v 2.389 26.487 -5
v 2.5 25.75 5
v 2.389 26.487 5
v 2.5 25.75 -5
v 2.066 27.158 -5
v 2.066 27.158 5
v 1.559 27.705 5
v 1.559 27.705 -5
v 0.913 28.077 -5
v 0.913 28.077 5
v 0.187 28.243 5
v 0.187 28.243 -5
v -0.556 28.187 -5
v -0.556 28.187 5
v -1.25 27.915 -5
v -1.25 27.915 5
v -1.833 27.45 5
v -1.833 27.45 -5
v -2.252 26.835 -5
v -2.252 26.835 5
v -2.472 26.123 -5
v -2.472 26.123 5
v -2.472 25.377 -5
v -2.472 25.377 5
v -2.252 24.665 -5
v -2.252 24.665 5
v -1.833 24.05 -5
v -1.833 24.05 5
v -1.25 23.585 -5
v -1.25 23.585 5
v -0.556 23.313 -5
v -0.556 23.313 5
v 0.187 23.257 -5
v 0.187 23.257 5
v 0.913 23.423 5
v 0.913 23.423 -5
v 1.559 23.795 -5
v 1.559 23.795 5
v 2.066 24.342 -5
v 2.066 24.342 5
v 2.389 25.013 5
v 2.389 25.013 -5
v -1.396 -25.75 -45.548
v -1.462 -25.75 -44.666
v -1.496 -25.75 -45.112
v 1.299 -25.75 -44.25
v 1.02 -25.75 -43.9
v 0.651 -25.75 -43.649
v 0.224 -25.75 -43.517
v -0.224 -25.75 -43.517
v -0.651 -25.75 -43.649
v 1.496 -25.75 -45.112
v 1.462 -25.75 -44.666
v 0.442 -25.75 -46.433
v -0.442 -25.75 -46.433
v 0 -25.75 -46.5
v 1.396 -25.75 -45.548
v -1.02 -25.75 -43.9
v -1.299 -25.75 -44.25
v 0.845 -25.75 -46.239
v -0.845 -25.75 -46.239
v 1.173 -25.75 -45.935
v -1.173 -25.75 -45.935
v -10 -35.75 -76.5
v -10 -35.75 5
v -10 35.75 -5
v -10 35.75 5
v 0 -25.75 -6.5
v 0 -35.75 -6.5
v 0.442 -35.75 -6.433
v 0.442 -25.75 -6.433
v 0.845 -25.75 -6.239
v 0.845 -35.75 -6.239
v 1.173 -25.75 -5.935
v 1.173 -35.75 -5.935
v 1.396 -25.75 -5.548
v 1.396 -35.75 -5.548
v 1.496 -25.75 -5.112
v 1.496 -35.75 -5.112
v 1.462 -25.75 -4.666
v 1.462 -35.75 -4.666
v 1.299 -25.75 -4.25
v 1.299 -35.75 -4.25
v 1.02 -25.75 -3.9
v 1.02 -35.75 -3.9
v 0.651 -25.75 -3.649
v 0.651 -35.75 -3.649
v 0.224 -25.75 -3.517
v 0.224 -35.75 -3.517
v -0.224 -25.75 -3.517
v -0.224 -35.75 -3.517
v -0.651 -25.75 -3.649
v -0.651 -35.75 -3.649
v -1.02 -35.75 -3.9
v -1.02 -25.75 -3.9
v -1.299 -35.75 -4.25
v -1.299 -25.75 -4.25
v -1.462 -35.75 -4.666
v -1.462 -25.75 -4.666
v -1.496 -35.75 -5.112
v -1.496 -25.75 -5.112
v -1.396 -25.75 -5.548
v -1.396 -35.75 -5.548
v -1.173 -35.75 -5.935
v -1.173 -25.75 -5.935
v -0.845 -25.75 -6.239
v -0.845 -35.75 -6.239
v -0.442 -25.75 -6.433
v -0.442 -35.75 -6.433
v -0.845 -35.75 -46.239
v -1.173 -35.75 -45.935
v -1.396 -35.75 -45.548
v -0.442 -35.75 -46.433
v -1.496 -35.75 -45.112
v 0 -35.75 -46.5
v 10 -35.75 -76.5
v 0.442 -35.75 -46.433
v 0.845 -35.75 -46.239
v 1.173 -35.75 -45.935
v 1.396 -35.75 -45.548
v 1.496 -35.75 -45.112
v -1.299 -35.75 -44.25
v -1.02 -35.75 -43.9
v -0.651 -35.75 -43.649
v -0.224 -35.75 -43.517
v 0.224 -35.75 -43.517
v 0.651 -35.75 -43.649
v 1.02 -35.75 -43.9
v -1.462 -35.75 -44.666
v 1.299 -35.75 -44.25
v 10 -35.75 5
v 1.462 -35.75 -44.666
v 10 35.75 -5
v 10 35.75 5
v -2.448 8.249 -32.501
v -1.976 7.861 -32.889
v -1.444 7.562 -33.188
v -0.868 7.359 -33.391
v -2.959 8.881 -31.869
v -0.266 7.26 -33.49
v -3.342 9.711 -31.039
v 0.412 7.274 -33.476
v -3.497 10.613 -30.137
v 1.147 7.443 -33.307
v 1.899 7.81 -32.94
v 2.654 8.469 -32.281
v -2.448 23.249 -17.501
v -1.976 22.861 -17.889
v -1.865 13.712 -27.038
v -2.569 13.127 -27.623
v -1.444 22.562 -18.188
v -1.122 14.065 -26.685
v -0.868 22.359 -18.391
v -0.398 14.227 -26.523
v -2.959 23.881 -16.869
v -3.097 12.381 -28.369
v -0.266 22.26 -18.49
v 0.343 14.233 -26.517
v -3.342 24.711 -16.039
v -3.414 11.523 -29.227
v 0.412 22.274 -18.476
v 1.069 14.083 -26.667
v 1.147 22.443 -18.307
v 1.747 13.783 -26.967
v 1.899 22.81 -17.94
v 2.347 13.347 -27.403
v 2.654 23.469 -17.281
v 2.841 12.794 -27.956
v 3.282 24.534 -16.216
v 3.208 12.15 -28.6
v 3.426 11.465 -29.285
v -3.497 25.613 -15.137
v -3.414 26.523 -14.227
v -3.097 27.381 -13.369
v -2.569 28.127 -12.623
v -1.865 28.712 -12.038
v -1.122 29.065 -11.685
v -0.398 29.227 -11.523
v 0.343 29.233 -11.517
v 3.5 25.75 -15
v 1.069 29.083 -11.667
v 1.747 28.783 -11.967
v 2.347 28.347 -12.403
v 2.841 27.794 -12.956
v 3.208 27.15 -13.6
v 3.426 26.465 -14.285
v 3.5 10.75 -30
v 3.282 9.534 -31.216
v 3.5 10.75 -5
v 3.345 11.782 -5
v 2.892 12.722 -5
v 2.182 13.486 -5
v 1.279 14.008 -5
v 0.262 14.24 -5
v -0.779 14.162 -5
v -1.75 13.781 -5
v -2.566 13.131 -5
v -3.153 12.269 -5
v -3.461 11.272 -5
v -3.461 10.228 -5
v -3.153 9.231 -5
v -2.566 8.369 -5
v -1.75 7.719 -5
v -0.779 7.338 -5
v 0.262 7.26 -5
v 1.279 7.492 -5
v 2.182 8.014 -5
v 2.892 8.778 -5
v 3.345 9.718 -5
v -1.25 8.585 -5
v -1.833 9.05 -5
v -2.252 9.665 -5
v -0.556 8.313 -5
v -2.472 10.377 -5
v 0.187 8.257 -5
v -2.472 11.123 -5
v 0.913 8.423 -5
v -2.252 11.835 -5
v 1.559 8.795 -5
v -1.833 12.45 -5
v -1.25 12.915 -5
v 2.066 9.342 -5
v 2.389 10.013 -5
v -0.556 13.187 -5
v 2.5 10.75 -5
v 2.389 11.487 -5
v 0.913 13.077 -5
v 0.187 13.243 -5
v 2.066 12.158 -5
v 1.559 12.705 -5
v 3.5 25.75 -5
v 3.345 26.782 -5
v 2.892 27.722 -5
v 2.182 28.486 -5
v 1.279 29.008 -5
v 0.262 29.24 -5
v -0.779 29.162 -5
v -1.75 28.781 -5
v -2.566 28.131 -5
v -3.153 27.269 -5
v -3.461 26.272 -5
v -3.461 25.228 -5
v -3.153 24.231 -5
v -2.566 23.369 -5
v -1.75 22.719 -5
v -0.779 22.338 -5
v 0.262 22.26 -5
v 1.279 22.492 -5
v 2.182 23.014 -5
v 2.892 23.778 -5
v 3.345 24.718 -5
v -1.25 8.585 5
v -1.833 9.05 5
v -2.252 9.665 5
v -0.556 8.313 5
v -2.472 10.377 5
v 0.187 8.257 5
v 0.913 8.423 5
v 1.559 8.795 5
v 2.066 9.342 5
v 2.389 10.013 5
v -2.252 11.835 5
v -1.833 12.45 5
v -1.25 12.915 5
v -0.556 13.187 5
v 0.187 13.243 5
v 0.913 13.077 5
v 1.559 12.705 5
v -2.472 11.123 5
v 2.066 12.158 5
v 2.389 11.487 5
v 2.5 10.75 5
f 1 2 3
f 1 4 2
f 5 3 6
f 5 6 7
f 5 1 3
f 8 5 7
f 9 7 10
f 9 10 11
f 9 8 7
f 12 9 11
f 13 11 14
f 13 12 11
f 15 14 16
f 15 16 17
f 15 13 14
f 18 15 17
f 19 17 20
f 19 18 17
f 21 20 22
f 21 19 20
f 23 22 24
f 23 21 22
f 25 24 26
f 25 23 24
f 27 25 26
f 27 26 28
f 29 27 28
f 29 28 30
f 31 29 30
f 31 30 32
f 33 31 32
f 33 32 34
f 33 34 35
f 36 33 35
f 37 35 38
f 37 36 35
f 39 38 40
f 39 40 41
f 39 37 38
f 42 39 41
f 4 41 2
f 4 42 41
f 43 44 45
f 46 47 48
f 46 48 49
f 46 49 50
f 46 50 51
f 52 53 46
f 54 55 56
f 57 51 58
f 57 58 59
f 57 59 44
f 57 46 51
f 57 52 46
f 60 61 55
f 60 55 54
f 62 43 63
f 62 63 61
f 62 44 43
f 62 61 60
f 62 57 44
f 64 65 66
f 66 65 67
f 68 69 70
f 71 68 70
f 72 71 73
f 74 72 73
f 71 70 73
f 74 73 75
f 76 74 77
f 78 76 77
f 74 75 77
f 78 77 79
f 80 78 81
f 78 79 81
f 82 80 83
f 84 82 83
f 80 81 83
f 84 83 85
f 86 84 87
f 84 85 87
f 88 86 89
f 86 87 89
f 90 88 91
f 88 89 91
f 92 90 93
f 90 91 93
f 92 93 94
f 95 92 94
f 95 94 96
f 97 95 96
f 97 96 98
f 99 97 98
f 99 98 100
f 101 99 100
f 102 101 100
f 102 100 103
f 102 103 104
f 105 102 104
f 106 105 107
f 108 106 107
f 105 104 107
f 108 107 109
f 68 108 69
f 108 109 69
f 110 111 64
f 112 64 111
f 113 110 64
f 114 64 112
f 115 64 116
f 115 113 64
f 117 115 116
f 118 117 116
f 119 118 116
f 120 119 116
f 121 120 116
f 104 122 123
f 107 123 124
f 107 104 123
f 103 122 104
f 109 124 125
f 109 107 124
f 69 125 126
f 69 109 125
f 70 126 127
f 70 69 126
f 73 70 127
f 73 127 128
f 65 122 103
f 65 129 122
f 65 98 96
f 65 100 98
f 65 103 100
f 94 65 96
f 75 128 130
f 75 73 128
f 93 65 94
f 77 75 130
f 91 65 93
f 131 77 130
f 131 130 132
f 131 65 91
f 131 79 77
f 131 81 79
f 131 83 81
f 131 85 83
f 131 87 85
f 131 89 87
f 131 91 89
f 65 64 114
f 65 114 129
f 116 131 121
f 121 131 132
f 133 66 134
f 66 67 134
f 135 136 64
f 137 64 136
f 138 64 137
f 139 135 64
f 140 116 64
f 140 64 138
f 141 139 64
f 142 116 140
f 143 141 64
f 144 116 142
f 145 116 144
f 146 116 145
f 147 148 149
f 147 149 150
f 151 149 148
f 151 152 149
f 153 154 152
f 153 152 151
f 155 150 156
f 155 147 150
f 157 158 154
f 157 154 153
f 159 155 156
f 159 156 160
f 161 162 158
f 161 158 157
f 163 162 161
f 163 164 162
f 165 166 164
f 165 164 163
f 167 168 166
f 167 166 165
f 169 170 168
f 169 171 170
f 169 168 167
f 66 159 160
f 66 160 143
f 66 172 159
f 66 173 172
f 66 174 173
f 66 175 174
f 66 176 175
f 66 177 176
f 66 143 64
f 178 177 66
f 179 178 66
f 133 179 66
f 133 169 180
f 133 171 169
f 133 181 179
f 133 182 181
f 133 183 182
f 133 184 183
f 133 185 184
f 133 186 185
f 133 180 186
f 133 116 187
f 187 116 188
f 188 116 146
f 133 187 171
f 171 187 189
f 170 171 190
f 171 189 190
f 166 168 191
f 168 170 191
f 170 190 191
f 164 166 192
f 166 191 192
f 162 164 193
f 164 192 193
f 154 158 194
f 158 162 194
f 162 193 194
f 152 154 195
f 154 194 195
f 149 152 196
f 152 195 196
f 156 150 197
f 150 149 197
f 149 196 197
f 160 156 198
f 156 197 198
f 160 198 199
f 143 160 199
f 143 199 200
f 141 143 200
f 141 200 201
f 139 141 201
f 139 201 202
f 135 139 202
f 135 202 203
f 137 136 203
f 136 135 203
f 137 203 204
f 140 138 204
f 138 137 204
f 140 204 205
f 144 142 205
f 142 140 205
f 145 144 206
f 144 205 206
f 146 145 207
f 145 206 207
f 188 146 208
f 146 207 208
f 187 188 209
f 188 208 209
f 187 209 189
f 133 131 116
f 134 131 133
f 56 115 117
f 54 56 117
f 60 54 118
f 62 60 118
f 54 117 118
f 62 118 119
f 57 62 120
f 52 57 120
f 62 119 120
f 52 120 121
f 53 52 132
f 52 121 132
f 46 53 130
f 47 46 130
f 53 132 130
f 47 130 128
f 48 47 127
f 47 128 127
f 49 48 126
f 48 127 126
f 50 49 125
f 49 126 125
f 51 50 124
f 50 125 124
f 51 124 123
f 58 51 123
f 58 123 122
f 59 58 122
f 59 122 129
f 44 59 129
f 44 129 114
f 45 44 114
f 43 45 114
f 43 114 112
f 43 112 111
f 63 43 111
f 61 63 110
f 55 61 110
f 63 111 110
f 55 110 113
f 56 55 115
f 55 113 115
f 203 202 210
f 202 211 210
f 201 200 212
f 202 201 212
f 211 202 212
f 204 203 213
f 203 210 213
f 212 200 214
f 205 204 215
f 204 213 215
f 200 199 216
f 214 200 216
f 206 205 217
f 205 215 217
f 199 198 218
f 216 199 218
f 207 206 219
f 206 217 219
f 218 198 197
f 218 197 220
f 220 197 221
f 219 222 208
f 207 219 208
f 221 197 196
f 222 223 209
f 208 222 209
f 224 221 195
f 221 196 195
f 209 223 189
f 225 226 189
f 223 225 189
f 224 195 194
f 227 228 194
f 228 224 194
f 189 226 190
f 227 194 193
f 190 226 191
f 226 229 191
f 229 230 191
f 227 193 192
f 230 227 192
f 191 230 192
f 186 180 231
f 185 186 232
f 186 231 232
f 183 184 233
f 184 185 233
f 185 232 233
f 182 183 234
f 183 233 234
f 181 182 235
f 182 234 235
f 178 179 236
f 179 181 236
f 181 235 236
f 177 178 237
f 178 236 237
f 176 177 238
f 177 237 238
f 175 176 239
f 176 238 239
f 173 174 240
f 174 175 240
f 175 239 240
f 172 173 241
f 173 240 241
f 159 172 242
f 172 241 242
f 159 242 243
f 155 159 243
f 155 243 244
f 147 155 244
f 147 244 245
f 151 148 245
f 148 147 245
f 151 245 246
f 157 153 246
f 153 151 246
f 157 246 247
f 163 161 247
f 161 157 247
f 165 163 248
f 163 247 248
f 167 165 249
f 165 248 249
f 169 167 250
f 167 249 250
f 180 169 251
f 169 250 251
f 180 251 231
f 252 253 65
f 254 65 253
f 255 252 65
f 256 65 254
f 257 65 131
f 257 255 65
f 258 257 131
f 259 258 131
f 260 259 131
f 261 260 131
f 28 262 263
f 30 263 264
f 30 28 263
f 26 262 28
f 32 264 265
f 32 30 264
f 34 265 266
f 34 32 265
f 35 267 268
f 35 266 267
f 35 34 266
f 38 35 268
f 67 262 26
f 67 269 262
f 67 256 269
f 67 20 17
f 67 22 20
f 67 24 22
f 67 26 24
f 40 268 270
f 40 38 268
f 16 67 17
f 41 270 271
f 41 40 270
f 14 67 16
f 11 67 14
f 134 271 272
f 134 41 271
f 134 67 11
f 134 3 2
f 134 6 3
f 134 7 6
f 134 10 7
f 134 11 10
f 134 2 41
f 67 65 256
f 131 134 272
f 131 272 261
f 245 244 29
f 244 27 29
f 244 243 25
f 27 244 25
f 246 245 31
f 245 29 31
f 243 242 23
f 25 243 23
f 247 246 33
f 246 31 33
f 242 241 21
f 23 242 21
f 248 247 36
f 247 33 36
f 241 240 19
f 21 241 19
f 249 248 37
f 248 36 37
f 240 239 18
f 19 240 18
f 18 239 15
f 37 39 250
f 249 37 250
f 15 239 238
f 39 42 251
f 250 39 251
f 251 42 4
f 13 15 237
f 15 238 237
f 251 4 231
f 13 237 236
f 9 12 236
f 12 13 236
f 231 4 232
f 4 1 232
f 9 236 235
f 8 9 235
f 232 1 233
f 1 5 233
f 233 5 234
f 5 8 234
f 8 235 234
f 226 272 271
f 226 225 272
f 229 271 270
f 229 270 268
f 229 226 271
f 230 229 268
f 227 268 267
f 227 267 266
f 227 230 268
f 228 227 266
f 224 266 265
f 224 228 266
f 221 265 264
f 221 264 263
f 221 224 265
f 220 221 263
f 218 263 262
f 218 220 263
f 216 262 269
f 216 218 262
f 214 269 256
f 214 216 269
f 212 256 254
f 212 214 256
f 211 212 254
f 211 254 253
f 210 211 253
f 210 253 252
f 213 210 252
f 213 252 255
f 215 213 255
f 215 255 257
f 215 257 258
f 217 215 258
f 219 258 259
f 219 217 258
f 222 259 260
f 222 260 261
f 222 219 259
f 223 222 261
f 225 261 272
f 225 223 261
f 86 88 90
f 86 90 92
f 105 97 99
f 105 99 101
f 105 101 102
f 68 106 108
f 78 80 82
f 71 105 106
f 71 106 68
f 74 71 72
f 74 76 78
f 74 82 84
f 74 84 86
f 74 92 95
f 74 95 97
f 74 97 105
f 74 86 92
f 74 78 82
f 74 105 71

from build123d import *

# Parameters (mm, degrees)
SKETCH1_W           = 20
SKETCH1_H           = 71.5
SKETCH1_R           = 2.5
BOSS_EXTRUDE1_DEPTH = 5
BOSS_EXTRUDE2_DEPTH = 20
CUT_EXTRUDE1_REACH  = 82.562
SKETCH3_R           = 3.5
SKETCH4_R           = 1.5
CUT_EXTRUDE2_DEPTH  = 10


with BuildPart() as part:
    # Sketch1 → Boss-Extrude1 (new, symmetric)
    with BuildSketch(Plane.XY):
        Rectangle(SKETCH1_W, SKETCH1_H)
        with Locations((0, 25.75)):
            Circle(SKETCH1_R, mode=Mode.SUBTRACT)
        with Locations((0, 10.75)):
            Circle(SKETCH1_R, mode=Mode.SUBTRACT)
    extrude(amount=BOSS_EXTRUDE1_DEPTH, both=True)

    # Sketch2 → Boss-Extrude2 (add, through all)
    with BuildSketch(Plane(origin=(10, 0, 0), x_dir=(0, 0, -1), z_dir=(1, 0, 0))):
        Polygon((5, 35.75), (5, -35.75), (76.5, -35.75), align=None)
    extrude(amount=-BOSS_EXTRUDE2_DEPTH)

    # Cut-Extrude1: up to this plane
    cut_extrude1_end = Plane(origin=(-10, -35.75, -76.5), z_dir=(0, 0.7071067811865439, -0.7071067811865512))
    # Sketch3 → Cut-Extrude1 (cut, up to the surface)
    with BuildSketch(Plane.XY.offset(-5), mode=Mode.PRIVATE) as cut_extrude1_sk1:
        with Locations((0, 25.75)):
            Circle(SKETCH3_R)
    cut_extrude1_tool1 = split(extrude(cut_extrude1_sk1.sketch, amount=-CUT_EXTRUDE1_REACH, mode=Mode.PRIVATE), bisect_by=cut_extrude1_end, keep=Keep.BOTH, mode=Mode.PRIVATE)
    add(cut_extrude1_tool1.solids().sort_by_distance((0, 25.75, -5))[0], mode=Mode.SUBTRACT)
    # Sketch3 → Cut-Extrude1 (cut, up to the surface)
    with BuildSketch(Plane.XY.offset(-5), mode=Mode.PRIVATE) as cut_extrude1_sk2:
        with Locations((0, 10.75)):
            Circle(SKETCH3_R)
    cut_extrude1_tool2 = split(extrude(cut_extrude1_sk2.sketch, amount=-CUT_EXTRUDE1_REACH, mode=Mode.PRIVATE), bisect_by=cut_extrude1_end, keep=Keep.BOTH, mode=Mode.PRIVATE)
    add(cut_extrude1_tool2.solids().sort_by_distance((0, 10.75, -5))[0], mode=Mode.SUBTRACT)

    # Sketch4 → Cut-Extrude2 (cut)
    with BuildSketch(Plane.XZ.offset(35.75)):
        with Locations(Location((0, -5, 0), (0, 0, 270))):
            Circle(SKETCH4_R)
        with Locations(Location((0, -45, 0), (0, 0, 270))):
            Circle(SKETCH4_R)
    extrude(amount=-CUT_EXTRUDE2_DEPTH, mode=Mode.SUBTRACT)


solid = part.part
